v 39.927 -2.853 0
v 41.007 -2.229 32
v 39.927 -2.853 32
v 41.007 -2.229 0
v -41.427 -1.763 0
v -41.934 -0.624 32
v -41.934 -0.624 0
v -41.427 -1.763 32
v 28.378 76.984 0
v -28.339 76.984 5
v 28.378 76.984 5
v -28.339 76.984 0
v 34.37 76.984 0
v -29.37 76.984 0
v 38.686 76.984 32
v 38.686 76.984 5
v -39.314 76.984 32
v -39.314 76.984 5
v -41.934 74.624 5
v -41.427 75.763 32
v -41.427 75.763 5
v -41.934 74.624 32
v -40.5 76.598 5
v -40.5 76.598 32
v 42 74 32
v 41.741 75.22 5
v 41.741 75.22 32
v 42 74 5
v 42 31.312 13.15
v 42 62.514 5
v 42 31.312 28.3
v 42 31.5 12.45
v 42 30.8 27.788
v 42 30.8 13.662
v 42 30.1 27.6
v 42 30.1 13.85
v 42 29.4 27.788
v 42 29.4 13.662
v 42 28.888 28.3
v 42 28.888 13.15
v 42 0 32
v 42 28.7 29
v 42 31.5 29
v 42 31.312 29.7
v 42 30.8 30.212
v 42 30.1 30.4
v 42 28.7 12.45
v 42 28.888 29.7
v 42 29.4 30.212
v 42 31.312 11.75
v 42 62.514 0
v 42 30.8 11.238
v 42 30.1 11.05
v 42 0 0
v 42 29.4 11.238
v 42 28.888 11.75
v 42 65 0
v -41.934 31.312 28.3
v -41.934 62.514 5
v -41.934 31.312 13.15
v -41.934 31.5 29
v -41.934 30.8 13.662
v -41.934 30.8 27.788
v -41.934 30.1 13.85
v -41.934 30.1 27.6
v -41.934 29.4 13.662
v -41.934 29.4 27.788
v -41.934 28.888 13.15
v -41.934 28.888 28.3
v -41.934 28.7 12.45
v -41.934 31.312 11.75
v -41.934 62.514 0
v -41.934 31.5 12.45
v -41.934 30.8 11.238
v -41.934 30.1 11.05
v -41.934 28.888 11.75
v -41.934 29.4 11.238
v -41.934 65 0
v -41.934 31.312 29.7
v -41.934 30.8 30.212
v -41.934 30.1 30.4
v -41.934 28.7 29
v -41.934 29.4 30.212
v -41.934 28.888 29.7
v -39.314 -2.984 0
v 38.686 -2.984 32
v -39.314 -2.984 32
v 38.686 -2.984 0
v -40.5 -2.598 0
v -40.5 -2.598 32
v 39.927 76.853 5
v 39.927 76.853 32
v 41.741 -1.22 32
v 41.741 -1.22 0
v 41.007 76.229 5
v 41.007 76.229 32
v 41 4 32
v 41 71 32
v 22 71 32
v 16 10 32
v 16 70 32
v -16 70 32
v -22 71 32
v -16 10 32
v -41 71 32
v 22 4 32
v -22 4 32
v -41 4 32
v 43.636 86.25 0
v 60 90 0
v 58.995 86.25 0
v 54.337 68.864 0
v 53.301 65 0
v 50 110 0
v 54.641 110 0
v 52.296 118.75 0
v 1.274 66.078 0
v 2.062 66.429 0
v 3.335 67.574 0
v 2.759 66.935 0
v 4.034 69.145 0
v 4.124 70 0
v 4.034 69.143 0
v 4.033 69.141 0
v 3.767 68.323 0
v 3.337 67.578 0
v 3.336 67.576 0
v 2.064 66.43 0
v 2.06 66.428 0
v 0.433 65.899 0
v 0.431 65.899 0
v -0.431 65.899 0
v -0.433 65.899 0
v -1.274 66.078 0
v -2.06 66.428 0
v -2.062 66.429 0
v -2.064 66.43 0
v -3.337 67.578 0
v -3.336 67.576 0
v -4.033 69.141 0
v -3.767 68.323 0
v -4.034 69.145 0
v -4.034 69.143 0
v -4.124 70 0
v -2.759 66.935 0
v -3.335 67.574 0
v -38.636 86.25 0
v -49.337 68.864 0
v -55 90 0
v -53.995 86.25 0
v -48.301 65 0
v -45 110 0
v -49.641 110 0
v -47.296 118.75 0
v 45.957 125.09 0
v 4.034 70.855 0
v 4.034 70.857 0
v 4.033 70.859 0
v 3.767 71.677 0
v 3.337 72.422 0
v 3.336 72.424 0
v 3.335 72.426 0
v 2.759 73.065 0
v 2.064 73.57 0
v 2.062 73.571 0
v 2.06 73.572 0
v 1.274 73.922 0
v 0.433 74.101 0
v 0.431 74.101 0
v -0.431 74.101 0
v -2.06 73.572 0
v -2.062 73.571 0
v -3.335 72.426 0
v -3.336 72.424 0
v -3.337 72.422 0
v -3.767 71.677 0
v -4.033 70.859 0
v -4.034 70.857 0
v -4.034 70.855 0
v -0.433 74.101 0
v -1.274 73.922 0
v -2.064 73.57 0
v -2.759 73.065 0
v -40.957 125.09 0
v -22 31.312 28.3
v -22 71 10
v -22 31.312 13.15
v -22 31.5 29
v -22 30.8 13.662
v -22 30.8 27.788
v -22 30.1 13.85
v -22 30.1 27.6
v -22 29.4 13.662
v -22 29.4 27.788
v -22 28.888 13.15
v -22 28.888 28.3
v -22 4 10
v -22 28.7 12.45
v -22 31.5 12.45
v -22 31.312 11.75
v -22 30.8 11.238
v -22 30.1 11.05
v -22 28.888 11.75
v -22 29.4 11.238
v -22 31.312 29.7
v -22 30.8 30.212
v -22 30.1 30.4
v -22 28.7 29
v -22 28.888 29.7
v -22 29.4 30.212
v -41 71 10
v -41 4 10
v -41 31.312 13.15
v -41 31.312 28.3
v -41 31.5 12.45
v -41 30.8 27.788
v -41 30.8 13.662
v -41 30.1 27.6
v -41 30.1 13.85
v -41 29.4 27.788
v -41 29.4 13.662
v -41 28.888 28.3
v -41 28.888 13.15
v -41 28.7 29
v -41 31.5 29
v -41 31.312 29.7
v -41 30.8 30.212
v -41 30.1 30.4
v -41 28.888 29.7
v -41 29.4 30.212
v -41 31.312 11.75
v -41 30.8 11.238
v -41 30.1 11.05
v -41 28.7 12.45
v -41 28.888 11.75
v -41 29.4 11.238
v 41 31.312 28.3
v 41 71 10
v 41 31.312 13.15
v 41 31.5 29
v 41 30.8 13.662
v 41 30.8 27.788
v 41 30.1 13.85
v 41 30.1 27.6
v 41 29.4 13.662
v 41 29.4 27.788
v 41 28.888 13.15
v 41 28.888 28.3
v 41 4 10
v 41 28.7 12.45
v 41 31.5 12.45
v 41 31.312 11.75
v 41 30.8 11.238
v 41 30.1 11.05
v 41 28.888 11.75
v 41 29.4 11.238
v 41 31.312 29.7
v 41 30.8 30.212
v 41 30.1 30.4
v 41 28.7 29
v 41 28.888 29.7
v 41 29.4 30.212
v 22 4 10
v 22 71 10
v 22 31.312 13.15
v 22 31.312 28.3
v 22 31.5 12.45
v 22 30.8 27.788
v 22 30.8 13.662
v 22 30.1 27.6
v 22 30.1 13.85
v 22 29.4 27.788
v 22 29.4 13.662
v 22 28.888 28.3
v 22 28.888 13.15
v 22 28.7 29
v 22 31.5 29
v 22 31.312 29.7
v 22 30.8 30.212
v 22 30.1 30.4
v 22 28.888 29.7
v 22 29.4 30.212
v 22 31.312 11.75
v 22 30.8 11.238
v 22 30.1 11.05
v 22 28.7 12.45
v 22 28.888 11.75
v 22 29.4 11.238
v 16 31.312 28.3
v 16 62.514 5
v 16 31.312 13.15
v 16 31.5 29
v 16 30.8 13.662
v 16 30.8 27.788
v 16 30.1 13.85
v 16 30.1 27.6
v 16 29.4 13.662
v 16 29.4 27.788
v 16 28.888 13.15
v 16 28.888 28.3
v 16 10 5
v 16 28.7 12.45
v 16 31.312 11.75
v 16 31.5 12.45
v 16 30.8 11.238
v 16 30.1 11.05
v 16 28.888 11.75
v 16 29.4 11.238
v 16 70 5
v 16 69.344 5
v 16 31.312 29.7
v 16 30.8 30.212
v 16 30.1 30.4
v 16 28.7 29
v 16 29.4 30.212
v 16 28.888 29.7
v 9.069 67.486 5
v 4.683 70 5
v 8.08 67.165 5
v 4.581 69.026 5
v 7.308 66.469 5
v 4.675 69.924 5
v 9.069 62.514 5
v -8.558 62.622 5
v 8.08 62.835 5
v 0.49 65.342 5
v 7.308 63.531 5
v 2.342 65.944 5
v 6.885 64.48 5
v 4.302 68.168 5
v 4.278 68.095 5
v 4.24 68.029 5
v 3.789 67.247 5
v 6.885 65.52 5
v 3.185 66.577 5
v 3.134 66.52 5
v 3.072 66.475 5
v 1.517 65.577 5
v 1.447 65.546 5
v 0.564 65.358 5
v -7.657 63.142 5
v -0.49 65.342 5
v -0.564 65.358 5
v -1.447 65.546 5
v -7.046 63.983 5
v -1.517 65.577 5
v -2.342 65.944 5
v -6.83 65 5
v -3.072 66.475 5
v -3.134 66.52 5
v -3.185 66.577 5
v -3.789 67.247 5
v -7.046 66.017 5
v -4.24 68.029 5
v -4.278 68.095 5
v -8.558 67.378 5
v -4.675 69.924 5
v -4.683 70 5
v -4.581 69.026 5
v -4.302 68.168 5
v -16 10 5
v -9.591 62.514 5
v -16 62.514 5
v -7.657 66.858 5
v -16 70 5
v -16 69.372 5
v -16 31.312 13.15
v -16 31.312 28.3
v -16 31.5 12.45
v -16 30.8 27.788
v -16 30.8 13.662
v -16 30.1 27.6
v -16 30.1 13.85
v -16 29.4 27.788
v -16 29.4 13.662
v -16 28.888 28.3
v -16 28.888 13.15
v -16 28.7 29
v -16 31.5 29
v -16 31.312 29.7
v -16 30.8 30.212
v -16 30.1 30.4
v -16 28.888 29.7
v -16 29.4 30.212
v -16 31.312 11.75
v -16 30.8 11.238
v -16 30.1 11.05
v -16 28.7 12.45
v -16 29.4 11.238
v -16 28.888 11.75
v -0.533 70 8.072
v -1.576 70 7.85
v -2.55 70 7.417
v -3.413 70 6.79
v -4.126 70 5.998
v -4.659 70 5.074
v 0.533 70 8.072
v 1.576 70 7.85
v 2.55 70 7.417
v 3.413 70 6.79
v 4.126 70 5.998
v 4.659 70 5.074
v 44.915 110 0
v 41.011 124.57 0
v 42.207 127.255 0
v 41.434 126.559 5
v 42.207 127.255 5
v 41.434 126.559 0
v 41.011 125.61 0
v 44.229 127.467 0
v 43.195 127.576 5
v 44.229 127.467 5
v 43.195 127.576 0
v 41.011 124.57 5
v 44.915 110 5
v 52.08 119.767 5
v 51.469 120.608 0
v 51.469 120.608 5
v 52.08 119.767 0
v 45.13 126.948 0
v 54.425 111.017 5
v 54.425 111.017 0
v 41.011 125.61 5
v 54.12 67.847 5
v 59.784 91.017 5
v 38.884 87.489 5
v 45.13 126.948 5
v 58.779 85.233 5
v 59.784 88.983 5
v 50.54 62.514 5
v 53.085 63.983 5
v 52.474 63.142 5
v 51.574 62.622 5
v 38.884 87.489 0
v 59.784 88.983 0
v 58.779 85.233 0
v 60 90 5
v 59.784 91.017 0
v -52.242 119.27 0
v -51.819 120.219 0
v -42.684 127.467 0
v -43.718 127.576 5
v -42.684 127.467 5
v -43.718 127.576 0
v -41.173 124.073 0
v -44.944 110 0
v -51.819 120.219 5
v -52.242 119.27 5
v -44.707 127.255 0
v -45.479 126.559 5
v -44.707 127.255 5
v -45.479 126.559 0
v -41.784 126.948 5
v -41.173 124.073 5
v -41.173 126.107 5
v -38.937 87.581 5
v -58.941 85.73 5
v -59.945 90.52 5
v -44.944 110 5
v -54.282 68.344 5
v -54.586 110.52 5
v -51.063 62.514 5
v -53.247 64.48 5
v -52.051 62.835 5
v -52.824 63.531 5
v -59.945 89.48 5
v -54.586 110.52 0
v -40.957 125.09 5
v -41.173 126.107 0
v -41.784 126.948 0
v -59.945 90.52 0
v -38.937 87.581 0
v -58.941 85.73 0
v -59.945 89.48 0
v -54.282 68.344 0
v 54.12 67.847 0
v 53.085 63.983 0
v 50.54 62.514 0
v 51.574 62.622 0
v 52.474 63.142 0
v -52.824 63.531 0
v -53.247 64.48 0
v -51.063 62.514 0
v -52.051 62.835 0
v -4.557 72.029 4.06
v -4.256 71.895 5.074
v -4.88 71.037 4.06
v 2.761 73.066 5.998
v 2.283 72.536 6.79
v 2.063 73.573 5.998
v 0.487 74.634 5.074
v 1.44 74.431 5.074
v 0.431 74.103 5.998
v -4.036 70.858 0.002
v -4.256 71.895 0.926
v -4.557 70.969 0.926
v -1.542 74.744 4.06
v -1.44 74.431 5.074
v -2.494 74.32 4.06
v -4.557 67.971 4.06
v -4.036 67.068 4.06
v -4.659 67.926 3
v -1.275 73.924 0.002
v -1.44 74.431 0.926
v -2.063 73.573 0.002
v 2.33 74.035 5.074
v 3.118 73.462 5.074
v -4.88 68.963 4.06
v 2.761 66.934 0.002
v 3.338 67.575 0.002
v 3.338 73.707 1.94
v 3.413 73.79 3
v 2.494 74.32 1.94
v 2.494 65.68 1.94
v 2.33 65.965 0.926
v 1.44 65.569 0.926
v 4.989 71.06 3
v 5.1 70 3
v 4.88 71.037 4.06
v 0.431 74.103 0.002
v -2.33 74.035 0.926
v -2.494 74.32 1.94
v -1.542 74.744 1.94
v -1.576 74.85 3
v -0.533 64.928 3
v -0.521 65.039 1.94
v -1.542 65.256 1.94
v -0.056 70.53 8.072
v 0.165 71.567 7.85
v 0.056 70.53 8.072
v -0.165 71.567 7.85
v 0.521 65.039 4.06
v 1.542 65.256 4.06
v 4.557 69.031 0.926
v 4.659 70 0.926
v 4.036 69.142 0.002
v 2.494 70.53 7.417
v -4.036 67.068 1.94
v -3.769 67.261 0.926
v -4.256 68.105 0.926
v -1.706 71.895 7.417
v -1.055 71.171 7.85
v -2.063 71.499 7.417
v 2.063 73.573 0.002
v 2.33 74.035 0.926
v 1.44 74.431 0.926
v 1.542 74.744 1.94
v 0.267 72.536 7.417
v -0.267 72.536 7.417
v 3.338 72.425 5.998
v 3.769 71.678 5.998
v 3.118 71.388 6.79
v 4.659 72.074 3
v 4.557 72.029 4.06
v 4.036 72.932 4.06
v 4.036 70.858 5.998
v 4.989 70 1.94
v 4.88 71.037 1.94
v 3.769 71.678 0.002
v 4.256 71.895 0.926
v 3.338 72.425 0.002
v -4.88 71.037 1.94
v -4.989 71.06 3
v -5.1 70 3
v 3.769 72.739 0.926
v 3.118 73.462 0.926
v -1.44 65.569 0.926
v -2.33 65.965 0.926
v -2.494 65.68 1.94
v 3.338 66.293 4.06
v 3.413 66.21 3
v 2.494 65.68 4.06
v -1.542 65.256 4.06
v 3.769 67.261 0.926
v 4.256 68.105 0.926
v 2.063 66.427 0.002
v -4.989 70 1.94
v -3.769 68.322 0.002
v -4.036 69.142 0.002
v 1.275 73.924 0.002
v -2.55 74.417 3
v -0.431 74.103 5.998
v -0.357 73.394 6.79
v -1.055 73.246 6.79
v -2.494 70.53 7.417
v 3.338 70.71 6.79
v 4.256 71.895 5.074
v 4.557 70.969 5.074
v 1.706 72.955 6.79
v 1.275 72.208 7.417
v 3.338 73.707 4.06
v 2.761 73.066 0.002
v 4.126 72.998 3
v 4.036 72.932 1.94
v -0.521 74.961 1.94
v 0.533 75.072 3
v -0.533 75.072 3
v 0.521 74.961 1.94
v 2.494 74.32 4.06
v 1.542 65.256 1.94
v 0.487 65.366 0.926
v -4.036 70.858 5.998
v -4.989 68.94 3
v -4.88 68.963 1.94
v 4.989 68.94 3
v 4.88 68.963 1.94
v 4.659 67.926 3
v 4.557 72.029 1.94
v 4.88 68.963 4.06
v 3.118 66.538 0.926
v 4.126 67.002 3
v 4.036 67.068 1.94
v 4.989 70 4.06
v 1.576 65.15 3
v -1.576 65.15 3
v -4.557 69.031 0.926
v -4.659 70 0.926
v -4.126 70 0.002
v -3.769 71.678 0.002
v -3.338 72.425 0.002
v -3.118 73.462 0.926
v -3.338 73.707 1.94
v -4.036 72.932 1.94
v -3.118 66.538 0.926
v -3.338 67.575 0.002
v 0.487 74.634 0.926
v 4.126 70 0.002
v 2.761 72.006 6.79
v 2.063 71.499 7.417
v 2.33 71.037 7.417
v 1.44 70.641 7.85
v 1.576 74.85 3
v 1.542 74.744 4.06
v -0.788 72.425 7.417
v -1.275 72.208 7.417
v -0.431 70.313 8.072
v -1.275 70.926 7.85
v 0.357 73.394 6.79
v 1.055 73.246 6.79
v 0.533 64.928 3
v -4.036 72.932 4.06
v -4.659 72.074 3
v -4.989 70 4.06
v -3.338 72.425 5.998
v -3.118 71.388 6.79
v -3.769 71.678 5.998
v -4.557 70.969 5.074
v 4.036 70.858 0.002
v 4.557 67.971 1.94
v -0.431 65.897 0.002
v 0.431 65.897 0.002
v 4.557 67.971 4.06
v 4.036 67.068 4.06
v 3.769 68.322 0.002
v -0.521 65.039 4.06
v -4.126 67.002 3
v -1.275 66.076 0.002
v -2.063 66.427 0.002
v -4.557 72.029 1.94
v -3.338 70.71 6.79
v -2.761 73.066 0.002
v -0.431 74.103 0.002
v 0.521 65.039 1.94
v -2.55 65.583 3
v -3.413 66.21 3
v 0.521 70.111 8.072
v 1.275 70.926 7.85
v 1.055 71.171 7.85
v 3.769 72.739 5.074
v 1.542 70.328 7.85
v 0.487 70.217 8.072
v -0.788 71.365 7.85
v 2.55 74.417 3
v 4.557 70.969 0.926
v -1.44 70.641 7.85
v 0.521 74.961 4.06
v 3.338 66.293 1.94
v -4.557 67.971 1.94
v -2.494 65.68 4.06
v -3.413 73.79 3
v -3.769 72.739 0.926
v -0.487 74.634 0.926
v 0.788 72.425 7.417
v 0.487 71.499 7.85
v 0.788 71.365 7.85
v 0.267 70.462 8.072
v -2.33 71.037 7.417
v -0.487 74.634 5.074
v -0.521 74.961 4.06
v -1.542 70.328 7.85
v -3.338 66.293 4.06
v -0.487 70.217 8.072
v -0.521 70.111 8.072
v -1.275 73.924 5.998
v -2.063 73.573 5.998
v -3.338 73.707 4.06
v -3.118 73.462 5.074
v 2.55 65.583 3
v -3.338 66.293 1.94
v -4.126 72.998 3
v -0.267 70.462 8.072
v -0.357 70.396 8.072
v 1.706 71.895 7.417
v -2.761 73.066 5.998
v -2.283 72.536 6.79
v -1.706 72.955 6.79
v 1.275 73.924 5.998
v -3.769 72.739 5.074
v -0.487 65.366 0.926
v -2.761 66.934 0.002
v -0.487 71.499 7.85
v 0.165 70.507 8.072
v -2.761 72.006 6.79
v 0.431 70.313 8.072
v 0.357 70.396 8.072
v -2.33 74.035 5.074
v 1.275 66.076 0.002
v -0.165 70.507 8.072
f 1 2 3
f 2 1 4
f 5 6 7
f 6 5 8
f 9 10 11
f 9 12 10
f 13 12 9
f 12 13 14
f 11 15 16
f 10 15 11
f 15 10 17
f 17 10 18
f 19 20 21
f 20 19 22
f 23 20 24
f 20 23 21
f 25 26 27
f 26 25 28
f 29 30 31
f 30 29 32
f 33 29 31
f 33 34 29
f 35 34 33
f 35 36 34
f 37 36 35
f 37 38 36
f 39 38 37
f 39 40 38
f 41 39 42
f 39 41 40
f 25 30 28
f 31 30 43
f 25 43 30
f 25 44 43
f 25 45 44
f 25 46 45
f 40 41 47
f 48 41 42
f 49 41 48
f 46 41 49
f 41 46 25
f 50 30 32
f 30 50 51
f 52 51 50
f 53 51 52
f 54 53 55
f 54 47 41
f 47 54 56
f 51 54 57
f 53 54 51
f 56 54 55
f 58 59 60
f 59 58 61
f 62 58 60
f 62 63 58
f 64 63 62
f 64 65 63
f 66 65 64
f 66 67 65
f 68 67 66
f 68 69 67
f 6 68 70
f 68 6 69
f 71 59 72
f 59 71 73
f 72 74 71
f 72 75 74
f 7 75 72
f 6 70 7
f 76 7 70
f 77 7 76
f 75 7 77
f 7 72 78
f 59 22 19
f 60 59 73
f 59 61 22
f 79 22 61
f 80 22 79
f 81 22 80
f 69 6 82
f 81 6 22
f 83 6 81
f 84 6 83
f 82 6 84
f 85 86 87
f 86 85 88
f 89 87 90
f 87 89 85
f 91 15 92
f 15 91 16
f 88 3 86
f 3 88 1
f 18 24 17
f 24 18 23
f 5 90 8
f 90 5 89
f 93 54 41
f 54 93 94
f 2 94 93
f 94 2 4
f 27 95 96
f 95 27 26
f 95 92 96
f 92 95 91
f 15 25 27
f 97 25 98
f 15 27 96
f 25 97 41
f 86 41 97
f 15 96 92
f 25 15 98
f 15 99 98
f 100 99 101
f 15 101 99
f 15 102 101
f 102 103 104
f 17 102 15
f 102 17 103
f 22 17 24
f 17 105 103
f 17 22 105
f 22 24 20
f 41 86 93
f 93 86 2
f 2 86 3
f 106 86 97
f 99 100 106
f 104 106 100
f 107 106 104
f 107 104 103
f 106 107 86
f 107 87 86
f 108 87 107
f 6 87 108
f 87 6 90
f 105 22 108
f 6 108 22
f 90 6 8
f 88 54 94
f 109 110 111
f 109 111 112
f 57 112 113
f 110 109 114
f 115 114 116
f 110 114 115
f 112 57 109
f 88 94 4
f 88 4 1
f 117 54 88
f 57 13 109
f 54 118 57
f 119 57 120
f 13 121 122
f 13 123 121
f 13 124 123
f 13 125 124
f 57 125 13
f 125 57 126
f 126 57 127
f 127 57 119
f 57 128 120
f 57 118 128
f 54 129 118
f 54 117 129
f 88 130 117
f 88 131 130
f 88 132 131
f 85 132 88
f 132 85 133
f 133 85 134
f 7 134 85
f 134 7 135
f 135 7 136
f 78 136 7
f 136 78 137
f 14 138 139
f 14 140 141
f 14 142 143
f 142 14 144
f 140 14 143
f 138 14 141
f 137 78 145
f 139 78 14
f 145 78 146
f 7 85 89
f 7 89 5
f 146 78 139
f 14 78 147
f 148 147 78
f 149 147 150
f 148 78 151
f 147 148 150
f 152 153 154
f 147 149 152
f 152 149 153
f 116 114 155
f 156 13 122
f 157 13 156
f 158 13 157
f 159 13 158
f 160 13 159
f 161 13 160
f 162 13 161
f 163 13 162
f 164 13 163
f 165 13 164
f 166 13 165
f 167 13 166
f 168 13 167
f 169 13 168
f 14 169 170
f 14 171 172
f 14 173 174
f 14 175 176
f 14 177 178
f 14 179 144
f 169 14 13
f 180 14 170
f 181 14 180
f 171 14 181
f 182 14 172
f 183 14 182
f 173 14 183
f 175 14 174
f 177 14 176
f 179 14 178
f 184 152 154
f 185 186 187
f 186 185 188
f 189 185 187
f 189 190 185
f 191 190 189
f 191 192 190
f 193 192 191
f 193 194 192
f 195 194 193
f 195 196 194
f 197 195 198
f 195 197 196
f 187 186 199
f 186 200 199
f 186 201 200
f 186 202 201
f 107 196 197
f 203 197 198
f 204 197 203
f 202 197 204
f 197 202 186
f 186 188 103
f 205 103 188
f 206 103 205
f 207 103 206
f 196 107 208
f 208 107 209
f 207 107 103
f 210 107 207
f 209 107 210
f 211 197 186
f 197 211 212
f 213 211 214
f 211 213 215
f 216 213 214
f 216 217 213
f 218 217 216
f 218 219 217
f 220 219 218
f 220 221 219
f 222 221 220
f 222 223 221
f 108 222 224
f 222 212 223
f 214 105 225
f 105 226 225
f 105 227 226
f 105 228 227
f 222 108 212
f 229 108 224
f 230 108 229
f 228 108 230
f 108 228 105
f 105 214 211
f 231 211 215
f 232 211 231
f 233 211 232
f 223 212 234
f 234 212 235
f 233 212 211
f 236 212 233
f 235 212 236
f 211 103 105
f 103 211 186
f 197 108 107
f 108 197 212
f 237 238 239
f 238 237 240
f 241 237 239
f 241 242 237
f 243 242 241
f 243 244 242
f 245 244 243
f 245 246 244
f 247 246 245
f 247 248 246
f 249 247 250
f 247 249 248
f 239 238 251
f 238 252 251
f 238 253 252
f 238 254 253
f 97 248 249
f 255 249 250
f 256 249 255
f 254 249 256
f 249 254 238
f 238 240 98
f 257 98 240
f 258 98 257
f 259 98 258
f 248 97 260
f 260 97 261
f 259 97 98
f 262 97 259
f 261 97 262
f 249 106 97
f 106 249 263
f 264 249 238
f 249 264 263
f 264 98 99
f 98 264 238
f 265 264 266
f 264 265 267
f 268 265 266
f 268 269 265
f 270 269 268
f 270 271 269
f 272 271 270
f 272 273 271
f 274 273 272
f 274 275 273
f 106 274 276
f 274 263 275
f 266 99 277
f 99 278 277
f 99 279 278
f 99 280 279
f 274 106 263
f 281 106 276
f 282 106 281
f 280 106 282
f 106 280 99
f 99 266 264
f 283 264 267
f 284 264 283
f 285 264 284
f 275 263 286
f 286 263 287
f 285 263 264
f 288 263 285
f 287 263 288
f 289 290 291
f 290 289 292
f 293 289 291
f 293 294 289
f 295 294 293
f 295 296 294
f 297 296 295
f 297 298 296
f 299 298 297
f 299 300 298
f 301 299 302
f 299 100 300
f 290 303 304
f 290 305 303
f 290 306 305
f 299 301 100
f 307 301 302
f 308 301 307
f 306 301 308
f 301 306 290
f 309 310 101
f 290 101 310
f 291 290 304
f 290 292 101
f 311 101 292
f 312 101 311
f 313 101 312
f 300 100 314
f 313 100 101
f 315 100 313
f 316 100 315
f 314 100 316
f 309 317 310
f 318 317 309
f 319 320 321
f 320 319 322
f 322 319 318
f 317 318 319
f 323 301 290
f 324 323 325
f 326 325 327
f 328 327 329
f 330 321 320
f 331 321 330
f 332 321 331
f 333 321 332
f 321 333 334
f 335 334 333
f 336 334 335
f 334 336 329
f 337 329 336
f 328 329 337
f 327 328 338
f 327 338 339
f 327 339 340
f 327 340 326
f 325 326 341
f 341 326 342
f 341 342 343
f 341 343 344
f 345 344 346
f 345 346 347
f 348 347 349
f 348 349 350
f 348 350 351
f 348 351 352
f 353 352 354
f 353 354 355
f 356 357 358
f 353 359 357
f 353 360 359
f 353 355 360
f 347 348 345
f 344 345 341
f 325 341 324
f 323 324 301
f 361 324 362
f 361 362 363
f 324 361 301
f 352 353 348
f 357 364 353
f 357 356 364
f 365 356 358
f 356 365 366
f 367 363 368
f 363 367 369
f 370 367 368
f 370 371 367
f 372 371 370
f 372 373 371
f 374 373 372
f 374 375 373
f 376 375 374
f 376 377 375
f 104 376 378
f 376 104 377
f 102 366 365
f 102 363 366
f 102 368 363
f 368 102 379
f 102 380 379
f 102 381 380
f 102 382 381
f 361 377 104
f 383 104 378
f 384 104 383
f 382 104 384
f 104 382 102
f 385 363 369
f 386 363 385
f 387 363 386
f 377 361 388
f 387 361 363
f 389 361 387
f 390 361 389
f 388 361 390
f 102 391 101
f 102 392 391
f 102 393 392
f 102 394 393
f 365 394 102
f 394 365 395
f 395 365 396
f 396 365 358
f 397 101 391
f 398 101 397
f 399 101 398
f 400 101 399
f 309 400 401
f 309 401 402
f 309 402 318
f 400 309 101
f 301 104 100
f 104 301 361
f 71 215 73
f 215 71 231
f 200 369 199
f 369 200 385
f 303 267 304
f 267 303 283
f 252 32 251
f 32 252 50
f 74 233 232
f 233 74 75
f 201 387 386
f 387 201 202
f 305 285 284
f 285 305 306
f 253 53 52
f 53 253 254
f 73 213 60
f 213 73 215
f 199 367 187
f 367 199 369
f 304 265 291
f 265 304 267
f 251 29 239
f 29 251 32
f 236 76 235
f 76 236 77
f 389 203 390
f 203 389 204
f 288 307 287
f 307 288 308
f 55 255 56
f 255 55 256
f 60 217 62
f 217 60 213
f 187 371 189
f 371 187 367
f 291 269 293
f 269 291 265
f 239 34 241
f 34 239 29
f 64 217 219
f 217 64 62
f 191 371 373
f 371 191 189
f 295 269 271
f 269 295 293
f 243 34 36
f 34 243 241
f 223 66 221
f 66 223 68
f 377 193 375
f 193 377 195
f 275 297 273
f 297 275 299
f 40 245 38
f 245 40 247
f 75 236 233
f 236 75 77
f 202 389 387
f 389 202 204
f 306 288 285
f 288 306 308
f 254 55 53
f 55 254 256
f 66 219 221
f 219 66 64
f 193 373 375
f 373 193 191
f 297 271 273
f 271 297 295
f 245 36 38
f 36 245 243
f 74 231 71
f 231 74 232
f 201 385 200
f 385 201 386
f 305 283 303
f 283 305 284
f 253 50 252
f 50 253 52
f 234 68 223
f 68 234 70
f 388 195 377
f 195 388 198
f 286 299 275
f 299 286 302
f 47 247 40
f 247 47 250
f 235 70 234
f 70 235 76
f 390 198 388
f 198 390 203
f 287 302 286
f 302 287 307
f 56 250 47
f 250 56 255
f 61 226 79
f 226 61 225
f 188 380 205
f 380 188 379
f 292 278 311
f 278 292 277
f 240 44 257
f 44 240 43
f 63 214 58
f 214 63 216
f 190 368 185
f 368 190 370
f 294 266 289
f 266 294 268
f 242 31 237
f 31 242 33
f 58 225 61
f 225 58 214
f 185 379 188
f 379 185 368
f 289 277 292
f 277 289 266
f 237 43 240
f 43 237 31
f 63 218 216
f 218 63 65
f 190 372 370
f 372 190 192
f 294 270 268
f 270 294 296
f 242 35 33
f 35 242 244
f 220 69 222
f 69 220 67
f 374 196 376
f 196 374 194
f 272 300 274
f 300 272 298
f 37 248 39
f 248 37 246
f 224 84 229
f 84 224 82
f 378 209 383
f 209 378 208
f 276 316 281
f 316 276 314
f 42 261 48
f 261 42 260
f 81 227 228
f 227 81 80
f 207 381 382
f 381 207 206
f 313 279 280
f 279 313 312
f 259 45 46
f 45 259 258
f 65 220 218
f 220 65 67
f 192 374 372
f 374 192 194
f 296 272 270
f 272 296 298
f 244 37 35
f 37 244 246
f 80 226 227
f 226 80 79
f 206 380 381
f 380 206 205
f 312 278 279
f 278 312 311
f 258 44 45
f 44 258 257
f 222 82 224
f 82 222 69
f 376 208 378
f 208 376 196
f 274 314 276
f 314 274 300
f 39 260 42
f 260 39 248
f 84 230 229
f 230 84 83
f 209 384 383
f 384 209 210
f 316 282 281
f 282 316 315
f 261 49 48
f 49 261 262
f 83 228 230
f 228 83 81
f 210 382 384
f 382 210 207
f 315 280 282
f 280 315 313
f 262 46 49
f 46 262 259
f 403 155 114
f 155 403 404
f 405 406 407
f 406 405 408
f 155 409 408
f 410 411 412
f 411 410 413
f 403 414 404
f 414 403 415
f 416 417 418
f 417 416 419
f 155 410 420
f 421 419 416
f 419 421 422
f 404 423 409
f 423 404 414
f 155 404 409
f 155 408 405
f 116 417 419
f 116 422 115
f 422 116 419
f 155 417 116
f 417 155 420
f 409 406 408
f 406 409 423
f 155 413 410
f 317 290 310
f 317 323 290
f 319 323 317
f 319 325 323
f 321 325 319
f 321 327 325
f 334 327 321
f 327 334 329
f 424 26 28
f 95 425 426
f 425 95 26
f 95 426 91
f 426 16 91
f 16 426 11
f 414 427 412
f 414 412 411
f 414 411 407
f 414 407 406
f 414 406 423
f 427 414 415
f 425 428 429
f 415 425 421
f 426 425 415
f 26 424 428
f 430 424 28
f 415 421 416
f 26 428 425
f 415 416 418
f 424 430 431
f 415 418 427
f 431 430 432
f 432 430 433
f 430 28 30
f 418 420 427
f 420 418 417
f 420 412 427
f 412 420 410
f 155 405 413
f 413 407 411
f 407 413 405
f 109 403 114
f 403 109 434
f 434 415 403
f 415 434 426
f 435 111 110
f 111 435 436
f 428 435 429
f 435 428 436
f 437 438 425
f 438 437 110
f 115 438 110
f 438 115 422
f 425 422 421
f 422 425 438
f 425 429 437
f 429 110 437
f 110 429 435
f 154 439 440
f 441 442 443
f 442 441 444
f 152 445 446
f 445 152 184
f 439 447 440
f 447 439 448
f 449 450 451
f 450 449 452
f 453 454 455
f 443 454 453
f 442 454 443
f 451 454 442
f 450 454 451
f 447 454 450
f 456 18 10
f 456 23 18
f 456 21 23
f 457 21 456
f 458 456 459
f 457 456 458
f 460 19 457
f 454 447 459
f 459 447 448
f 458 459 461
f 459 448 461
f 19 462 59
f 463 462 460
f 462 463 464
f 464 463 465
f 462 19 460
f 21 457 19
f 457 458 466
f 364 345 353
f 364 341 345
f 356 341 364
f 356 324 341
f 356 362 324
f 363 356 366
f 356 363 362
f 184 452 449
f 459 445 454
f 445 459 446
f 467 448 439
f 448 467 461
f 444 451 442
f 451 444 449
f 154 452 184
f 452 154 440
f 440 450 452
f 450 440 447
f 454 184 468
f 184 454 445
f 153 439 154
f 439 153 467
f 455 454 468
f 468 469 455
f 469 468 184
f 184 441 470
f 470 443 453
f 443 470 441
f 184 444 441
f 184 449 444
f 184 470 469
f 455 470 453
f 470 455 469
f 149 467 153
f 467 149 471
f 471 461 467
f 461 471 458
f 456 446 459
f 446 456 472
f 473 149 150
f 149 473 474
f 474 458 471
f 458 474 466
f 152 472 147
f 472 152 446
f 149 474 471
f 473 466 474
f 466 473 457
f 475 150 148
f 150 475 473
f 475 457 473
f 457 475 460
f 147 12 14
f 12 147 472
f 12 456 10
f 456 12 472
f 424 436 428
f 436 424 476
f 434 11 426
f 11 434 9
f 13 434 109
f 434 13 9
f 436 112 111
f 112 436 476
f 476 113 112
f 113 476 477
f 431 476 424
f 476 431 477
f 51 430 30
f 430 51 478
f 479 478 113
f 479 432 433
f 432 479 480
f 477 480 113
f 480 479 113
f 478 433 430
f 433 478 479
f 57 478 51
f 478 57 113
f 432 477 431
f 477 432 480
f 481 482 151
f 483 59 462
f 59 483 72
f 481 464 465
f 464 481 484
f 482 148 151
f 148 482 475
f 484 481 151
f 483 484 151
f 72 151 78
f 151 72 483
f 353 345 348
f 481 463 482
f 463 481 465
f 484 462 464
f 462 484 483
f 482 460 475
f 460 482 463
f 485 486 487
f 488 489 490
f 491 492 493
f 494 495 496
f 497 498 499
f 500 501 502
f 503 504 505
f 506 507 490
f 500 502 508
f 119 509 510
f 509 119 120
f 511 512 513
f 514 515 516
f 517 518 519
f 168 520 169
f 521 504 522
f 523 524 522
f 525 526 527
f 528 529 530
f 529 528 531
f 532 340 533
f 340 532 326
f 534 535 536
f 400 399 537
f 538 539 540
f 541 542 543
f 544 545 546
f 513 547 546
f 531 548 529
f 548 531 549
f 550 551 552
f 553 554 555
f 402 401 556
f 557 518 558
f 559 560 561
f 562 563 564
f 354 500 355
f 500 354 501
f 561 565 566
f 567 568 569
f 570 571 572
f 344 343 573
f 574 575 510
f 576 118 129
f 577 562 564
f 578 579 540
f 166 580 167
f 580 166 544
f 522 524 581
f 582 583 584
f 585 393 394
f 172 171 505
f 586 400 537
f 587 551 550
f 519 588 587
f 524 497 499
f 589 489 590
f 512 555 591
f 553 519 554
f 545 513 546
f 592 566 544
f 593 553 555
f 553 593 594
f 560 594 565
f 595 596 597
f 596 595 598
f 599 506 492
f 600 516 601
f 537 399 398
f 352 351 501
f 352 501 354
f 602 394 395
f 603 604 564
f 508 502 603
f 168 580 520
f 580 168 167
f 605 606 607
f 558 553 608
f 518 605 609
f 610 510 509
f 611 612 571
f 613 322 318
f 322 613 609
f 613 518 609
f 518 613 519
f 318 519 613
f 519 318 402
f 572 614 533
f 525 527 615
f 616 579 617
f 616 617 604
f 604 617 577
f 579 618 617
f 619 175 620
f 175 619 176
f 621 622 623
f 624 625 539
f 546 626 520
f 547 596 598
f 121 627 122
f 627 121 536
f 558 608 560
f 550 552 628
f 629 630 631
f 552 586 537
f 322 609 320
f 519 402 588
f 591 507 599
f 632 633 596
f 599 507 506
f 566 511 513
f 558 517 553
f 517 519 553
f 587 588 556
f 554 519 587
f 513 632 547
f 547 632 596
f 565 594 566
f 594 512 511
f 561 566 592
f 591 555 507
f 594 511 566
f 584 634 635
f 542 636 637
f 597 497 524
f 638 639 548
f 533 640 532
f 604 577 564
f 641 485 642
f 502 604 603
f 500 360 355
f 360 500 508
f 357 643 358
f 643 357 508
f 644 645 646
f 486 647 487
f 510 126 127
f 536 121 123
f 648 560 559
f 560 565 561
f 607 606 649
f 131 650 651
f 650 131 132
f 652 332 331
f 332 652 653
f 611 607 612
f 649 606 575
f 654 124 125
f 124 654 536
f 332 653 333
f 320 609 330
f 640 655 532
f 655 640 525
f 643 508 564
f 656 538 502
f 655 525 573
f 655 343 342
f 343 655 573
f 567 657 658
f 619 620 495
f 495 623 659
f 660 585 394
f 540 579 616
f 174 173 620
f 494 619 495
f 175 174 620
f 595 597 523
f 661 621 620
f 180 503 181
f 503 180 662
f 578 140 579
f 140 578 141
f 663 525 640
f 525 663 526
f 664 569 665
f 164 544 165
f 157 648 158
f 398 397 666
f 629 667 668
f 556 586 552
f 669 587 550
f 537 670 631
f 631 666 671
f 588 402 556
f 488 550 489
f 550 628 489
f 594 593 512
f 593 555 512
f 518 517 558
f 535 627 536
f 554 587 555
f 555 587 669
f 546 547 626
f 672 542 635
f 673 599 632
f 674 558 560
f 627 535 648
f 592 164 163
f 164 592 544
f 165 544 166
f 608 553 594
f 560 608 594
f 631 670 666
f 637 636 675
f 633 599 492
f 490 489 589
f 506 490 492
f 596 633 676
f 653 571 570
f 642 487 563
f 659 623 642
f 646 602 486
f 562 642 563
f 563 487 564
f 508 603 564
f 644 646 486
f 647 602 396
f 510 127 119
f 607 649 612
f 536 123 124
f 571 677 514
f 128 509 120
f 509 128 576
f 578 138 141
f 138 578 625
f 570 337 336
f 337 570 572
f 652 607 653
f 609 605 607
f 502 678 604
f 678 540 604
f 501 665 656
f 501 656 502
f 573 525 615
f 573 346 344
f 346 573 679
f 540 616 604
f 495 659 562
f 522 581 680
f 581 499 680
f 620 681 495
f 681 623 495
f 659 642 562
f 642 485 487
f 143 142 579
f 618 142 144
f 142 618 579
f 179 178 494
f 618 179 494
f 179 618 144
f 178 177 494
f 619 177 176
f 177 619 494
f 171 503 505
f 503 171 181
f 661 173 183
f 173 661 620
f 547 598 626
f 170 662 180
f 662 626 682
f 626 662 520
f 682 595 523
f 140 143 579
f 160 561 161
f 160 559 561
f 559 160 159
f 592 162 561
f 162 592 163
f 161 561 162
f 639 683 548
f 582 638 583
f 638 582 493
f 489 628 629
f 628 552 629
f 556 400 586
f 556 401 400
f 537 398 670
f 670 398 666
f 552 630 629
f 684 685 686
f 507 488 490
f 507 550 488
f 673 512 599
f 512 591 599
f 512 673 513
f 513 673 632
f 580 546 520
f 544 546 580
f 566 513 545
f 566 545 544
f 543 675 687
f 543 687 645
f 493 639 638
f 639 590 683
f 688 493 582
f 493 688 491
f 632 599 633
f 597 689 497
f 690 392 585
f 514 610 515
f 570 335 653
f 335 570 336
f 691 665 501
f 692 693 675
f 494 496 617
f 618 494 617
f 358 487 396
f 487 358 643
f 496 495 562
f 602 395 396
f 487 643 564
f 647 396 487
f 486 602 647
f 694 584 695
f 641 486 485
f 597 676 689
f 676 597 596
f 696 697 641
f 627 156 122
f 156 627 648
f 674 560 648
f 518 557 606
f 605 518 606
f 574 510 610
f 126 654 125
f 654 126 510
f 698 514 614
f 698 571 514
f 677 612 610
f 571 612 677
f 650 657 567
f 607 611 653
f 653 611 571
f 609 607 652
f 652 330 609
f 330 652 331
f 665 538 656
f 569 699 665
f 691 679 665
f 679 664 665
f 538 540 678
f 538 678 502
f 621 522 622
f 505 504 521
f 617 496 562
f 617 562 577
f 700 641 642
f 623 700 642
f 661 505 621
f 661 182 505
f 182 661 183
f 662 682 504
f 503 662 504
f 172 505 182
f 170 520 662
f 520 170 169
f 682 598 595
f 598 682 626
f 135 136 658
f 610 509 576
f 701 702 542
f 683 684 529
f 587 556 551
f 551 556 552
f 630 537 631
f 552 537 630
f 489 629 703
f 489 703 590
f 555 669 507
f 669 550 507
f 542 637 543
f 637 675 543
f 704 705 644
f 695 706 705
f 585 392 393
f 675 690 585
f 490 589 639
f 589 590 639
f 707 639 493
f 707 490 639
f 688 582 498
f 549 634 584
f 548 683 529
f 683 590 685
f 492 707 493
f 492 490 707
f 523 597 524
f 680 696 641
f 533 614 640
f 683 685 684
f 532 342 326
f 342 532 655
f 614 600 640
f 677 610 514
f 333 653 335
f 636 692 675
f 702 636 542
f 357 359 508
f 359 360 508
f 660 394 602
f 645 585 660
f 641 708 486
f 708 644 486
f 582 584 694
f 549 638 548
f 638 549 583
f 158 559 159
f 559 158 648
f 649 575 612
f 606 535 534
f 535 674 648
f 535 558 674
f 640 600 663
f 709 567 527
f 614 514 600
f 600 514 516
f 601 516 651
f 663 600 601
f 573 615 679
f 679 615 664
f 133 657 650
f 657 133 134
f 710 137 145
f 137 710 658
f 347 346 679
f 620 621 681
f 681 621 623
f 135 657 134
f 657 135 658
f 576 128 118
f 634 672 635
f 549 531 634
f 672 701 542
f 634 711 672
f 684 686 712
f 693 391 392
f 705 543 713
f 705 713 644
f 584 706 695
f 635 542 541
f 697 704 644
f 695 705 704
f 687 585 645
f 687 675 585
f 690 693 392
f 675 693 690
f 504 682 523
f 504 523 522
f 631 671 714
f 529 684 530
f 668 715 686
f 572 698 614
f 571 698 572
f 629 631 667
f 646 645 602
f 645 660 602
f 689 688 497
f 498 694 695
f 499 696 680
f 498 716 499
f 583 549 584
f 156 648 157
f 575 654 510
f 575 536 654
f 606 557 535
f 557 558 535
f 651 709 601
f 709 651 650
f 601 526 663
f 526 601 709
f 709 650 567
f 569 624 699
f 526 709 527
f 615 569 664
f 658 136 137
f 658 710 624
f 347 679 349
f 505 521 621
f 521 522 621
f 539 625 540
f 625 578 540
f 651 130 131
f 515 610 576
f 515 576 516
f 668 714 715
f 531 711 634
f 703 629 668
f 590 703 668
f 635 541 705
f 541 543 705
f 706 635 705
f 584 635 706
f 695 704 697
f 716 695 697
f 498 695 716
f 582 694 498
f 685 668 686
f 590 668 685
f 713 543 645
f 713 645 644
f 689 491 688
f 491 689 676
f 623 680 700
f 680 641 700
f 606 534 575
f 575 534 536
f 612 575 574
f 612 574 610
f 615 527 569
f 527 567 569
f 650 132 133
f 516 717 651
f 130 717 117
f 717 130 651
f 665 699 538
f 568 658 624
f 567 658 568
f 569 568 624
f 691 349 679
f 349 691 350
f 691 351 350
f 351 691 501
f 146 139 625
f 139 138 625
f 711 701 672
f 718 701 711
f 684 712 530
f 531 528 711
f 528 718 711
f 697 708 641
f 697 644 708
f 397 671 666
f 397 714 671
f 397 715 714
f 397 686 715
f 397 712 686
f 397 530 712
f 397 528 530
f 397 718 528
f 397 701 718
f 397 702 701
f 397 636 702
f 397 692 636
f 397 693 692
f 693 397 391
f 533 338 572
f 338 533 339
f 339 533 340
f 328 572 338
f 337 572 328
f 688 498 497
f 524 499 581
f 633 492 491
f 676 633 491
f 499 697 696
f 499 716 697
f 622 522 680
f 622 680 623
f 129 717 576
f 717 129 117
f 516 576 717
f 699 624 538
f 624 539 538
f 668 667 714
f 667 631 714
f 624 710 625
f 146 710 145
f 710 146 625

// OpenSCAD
difference(){

union(){

difference(){
minkowski(){
translate([-39,0,0])cube([78,74,32]);
cylinder(d=6,h=0.00001,$fn=15);
}
translate([-41,4,10])cube([19,67,30]);
mirror([-1,0,0])translate([-41,4,10])cube([19,67,30]);
translate([-16,10,5])cube([32,60,30]);
translate([0,30.1,2.45+10])rotate([0,90,0])
cylinder(d=2.8,h=100,center=true,$fn=12);
translate([0,30.1,19+10])rotate([0,90,0])
cylinder(d=2.8,h=100,center=true,$fn=12);   
}

minkowski(){
difference(){
translate([0,90,0])cylinder(d=115,h=5,$fn=12);
translate([0,110,0])cylinder(d=95,h=5,$fn=12);
translate([-60,0,0])cube([120,65,10]);
}
cylinder(d=5,h=0.000001,$fn=15);
}

}

translate([0,70,3])sphere(d=10.2,$fn=30);

}
